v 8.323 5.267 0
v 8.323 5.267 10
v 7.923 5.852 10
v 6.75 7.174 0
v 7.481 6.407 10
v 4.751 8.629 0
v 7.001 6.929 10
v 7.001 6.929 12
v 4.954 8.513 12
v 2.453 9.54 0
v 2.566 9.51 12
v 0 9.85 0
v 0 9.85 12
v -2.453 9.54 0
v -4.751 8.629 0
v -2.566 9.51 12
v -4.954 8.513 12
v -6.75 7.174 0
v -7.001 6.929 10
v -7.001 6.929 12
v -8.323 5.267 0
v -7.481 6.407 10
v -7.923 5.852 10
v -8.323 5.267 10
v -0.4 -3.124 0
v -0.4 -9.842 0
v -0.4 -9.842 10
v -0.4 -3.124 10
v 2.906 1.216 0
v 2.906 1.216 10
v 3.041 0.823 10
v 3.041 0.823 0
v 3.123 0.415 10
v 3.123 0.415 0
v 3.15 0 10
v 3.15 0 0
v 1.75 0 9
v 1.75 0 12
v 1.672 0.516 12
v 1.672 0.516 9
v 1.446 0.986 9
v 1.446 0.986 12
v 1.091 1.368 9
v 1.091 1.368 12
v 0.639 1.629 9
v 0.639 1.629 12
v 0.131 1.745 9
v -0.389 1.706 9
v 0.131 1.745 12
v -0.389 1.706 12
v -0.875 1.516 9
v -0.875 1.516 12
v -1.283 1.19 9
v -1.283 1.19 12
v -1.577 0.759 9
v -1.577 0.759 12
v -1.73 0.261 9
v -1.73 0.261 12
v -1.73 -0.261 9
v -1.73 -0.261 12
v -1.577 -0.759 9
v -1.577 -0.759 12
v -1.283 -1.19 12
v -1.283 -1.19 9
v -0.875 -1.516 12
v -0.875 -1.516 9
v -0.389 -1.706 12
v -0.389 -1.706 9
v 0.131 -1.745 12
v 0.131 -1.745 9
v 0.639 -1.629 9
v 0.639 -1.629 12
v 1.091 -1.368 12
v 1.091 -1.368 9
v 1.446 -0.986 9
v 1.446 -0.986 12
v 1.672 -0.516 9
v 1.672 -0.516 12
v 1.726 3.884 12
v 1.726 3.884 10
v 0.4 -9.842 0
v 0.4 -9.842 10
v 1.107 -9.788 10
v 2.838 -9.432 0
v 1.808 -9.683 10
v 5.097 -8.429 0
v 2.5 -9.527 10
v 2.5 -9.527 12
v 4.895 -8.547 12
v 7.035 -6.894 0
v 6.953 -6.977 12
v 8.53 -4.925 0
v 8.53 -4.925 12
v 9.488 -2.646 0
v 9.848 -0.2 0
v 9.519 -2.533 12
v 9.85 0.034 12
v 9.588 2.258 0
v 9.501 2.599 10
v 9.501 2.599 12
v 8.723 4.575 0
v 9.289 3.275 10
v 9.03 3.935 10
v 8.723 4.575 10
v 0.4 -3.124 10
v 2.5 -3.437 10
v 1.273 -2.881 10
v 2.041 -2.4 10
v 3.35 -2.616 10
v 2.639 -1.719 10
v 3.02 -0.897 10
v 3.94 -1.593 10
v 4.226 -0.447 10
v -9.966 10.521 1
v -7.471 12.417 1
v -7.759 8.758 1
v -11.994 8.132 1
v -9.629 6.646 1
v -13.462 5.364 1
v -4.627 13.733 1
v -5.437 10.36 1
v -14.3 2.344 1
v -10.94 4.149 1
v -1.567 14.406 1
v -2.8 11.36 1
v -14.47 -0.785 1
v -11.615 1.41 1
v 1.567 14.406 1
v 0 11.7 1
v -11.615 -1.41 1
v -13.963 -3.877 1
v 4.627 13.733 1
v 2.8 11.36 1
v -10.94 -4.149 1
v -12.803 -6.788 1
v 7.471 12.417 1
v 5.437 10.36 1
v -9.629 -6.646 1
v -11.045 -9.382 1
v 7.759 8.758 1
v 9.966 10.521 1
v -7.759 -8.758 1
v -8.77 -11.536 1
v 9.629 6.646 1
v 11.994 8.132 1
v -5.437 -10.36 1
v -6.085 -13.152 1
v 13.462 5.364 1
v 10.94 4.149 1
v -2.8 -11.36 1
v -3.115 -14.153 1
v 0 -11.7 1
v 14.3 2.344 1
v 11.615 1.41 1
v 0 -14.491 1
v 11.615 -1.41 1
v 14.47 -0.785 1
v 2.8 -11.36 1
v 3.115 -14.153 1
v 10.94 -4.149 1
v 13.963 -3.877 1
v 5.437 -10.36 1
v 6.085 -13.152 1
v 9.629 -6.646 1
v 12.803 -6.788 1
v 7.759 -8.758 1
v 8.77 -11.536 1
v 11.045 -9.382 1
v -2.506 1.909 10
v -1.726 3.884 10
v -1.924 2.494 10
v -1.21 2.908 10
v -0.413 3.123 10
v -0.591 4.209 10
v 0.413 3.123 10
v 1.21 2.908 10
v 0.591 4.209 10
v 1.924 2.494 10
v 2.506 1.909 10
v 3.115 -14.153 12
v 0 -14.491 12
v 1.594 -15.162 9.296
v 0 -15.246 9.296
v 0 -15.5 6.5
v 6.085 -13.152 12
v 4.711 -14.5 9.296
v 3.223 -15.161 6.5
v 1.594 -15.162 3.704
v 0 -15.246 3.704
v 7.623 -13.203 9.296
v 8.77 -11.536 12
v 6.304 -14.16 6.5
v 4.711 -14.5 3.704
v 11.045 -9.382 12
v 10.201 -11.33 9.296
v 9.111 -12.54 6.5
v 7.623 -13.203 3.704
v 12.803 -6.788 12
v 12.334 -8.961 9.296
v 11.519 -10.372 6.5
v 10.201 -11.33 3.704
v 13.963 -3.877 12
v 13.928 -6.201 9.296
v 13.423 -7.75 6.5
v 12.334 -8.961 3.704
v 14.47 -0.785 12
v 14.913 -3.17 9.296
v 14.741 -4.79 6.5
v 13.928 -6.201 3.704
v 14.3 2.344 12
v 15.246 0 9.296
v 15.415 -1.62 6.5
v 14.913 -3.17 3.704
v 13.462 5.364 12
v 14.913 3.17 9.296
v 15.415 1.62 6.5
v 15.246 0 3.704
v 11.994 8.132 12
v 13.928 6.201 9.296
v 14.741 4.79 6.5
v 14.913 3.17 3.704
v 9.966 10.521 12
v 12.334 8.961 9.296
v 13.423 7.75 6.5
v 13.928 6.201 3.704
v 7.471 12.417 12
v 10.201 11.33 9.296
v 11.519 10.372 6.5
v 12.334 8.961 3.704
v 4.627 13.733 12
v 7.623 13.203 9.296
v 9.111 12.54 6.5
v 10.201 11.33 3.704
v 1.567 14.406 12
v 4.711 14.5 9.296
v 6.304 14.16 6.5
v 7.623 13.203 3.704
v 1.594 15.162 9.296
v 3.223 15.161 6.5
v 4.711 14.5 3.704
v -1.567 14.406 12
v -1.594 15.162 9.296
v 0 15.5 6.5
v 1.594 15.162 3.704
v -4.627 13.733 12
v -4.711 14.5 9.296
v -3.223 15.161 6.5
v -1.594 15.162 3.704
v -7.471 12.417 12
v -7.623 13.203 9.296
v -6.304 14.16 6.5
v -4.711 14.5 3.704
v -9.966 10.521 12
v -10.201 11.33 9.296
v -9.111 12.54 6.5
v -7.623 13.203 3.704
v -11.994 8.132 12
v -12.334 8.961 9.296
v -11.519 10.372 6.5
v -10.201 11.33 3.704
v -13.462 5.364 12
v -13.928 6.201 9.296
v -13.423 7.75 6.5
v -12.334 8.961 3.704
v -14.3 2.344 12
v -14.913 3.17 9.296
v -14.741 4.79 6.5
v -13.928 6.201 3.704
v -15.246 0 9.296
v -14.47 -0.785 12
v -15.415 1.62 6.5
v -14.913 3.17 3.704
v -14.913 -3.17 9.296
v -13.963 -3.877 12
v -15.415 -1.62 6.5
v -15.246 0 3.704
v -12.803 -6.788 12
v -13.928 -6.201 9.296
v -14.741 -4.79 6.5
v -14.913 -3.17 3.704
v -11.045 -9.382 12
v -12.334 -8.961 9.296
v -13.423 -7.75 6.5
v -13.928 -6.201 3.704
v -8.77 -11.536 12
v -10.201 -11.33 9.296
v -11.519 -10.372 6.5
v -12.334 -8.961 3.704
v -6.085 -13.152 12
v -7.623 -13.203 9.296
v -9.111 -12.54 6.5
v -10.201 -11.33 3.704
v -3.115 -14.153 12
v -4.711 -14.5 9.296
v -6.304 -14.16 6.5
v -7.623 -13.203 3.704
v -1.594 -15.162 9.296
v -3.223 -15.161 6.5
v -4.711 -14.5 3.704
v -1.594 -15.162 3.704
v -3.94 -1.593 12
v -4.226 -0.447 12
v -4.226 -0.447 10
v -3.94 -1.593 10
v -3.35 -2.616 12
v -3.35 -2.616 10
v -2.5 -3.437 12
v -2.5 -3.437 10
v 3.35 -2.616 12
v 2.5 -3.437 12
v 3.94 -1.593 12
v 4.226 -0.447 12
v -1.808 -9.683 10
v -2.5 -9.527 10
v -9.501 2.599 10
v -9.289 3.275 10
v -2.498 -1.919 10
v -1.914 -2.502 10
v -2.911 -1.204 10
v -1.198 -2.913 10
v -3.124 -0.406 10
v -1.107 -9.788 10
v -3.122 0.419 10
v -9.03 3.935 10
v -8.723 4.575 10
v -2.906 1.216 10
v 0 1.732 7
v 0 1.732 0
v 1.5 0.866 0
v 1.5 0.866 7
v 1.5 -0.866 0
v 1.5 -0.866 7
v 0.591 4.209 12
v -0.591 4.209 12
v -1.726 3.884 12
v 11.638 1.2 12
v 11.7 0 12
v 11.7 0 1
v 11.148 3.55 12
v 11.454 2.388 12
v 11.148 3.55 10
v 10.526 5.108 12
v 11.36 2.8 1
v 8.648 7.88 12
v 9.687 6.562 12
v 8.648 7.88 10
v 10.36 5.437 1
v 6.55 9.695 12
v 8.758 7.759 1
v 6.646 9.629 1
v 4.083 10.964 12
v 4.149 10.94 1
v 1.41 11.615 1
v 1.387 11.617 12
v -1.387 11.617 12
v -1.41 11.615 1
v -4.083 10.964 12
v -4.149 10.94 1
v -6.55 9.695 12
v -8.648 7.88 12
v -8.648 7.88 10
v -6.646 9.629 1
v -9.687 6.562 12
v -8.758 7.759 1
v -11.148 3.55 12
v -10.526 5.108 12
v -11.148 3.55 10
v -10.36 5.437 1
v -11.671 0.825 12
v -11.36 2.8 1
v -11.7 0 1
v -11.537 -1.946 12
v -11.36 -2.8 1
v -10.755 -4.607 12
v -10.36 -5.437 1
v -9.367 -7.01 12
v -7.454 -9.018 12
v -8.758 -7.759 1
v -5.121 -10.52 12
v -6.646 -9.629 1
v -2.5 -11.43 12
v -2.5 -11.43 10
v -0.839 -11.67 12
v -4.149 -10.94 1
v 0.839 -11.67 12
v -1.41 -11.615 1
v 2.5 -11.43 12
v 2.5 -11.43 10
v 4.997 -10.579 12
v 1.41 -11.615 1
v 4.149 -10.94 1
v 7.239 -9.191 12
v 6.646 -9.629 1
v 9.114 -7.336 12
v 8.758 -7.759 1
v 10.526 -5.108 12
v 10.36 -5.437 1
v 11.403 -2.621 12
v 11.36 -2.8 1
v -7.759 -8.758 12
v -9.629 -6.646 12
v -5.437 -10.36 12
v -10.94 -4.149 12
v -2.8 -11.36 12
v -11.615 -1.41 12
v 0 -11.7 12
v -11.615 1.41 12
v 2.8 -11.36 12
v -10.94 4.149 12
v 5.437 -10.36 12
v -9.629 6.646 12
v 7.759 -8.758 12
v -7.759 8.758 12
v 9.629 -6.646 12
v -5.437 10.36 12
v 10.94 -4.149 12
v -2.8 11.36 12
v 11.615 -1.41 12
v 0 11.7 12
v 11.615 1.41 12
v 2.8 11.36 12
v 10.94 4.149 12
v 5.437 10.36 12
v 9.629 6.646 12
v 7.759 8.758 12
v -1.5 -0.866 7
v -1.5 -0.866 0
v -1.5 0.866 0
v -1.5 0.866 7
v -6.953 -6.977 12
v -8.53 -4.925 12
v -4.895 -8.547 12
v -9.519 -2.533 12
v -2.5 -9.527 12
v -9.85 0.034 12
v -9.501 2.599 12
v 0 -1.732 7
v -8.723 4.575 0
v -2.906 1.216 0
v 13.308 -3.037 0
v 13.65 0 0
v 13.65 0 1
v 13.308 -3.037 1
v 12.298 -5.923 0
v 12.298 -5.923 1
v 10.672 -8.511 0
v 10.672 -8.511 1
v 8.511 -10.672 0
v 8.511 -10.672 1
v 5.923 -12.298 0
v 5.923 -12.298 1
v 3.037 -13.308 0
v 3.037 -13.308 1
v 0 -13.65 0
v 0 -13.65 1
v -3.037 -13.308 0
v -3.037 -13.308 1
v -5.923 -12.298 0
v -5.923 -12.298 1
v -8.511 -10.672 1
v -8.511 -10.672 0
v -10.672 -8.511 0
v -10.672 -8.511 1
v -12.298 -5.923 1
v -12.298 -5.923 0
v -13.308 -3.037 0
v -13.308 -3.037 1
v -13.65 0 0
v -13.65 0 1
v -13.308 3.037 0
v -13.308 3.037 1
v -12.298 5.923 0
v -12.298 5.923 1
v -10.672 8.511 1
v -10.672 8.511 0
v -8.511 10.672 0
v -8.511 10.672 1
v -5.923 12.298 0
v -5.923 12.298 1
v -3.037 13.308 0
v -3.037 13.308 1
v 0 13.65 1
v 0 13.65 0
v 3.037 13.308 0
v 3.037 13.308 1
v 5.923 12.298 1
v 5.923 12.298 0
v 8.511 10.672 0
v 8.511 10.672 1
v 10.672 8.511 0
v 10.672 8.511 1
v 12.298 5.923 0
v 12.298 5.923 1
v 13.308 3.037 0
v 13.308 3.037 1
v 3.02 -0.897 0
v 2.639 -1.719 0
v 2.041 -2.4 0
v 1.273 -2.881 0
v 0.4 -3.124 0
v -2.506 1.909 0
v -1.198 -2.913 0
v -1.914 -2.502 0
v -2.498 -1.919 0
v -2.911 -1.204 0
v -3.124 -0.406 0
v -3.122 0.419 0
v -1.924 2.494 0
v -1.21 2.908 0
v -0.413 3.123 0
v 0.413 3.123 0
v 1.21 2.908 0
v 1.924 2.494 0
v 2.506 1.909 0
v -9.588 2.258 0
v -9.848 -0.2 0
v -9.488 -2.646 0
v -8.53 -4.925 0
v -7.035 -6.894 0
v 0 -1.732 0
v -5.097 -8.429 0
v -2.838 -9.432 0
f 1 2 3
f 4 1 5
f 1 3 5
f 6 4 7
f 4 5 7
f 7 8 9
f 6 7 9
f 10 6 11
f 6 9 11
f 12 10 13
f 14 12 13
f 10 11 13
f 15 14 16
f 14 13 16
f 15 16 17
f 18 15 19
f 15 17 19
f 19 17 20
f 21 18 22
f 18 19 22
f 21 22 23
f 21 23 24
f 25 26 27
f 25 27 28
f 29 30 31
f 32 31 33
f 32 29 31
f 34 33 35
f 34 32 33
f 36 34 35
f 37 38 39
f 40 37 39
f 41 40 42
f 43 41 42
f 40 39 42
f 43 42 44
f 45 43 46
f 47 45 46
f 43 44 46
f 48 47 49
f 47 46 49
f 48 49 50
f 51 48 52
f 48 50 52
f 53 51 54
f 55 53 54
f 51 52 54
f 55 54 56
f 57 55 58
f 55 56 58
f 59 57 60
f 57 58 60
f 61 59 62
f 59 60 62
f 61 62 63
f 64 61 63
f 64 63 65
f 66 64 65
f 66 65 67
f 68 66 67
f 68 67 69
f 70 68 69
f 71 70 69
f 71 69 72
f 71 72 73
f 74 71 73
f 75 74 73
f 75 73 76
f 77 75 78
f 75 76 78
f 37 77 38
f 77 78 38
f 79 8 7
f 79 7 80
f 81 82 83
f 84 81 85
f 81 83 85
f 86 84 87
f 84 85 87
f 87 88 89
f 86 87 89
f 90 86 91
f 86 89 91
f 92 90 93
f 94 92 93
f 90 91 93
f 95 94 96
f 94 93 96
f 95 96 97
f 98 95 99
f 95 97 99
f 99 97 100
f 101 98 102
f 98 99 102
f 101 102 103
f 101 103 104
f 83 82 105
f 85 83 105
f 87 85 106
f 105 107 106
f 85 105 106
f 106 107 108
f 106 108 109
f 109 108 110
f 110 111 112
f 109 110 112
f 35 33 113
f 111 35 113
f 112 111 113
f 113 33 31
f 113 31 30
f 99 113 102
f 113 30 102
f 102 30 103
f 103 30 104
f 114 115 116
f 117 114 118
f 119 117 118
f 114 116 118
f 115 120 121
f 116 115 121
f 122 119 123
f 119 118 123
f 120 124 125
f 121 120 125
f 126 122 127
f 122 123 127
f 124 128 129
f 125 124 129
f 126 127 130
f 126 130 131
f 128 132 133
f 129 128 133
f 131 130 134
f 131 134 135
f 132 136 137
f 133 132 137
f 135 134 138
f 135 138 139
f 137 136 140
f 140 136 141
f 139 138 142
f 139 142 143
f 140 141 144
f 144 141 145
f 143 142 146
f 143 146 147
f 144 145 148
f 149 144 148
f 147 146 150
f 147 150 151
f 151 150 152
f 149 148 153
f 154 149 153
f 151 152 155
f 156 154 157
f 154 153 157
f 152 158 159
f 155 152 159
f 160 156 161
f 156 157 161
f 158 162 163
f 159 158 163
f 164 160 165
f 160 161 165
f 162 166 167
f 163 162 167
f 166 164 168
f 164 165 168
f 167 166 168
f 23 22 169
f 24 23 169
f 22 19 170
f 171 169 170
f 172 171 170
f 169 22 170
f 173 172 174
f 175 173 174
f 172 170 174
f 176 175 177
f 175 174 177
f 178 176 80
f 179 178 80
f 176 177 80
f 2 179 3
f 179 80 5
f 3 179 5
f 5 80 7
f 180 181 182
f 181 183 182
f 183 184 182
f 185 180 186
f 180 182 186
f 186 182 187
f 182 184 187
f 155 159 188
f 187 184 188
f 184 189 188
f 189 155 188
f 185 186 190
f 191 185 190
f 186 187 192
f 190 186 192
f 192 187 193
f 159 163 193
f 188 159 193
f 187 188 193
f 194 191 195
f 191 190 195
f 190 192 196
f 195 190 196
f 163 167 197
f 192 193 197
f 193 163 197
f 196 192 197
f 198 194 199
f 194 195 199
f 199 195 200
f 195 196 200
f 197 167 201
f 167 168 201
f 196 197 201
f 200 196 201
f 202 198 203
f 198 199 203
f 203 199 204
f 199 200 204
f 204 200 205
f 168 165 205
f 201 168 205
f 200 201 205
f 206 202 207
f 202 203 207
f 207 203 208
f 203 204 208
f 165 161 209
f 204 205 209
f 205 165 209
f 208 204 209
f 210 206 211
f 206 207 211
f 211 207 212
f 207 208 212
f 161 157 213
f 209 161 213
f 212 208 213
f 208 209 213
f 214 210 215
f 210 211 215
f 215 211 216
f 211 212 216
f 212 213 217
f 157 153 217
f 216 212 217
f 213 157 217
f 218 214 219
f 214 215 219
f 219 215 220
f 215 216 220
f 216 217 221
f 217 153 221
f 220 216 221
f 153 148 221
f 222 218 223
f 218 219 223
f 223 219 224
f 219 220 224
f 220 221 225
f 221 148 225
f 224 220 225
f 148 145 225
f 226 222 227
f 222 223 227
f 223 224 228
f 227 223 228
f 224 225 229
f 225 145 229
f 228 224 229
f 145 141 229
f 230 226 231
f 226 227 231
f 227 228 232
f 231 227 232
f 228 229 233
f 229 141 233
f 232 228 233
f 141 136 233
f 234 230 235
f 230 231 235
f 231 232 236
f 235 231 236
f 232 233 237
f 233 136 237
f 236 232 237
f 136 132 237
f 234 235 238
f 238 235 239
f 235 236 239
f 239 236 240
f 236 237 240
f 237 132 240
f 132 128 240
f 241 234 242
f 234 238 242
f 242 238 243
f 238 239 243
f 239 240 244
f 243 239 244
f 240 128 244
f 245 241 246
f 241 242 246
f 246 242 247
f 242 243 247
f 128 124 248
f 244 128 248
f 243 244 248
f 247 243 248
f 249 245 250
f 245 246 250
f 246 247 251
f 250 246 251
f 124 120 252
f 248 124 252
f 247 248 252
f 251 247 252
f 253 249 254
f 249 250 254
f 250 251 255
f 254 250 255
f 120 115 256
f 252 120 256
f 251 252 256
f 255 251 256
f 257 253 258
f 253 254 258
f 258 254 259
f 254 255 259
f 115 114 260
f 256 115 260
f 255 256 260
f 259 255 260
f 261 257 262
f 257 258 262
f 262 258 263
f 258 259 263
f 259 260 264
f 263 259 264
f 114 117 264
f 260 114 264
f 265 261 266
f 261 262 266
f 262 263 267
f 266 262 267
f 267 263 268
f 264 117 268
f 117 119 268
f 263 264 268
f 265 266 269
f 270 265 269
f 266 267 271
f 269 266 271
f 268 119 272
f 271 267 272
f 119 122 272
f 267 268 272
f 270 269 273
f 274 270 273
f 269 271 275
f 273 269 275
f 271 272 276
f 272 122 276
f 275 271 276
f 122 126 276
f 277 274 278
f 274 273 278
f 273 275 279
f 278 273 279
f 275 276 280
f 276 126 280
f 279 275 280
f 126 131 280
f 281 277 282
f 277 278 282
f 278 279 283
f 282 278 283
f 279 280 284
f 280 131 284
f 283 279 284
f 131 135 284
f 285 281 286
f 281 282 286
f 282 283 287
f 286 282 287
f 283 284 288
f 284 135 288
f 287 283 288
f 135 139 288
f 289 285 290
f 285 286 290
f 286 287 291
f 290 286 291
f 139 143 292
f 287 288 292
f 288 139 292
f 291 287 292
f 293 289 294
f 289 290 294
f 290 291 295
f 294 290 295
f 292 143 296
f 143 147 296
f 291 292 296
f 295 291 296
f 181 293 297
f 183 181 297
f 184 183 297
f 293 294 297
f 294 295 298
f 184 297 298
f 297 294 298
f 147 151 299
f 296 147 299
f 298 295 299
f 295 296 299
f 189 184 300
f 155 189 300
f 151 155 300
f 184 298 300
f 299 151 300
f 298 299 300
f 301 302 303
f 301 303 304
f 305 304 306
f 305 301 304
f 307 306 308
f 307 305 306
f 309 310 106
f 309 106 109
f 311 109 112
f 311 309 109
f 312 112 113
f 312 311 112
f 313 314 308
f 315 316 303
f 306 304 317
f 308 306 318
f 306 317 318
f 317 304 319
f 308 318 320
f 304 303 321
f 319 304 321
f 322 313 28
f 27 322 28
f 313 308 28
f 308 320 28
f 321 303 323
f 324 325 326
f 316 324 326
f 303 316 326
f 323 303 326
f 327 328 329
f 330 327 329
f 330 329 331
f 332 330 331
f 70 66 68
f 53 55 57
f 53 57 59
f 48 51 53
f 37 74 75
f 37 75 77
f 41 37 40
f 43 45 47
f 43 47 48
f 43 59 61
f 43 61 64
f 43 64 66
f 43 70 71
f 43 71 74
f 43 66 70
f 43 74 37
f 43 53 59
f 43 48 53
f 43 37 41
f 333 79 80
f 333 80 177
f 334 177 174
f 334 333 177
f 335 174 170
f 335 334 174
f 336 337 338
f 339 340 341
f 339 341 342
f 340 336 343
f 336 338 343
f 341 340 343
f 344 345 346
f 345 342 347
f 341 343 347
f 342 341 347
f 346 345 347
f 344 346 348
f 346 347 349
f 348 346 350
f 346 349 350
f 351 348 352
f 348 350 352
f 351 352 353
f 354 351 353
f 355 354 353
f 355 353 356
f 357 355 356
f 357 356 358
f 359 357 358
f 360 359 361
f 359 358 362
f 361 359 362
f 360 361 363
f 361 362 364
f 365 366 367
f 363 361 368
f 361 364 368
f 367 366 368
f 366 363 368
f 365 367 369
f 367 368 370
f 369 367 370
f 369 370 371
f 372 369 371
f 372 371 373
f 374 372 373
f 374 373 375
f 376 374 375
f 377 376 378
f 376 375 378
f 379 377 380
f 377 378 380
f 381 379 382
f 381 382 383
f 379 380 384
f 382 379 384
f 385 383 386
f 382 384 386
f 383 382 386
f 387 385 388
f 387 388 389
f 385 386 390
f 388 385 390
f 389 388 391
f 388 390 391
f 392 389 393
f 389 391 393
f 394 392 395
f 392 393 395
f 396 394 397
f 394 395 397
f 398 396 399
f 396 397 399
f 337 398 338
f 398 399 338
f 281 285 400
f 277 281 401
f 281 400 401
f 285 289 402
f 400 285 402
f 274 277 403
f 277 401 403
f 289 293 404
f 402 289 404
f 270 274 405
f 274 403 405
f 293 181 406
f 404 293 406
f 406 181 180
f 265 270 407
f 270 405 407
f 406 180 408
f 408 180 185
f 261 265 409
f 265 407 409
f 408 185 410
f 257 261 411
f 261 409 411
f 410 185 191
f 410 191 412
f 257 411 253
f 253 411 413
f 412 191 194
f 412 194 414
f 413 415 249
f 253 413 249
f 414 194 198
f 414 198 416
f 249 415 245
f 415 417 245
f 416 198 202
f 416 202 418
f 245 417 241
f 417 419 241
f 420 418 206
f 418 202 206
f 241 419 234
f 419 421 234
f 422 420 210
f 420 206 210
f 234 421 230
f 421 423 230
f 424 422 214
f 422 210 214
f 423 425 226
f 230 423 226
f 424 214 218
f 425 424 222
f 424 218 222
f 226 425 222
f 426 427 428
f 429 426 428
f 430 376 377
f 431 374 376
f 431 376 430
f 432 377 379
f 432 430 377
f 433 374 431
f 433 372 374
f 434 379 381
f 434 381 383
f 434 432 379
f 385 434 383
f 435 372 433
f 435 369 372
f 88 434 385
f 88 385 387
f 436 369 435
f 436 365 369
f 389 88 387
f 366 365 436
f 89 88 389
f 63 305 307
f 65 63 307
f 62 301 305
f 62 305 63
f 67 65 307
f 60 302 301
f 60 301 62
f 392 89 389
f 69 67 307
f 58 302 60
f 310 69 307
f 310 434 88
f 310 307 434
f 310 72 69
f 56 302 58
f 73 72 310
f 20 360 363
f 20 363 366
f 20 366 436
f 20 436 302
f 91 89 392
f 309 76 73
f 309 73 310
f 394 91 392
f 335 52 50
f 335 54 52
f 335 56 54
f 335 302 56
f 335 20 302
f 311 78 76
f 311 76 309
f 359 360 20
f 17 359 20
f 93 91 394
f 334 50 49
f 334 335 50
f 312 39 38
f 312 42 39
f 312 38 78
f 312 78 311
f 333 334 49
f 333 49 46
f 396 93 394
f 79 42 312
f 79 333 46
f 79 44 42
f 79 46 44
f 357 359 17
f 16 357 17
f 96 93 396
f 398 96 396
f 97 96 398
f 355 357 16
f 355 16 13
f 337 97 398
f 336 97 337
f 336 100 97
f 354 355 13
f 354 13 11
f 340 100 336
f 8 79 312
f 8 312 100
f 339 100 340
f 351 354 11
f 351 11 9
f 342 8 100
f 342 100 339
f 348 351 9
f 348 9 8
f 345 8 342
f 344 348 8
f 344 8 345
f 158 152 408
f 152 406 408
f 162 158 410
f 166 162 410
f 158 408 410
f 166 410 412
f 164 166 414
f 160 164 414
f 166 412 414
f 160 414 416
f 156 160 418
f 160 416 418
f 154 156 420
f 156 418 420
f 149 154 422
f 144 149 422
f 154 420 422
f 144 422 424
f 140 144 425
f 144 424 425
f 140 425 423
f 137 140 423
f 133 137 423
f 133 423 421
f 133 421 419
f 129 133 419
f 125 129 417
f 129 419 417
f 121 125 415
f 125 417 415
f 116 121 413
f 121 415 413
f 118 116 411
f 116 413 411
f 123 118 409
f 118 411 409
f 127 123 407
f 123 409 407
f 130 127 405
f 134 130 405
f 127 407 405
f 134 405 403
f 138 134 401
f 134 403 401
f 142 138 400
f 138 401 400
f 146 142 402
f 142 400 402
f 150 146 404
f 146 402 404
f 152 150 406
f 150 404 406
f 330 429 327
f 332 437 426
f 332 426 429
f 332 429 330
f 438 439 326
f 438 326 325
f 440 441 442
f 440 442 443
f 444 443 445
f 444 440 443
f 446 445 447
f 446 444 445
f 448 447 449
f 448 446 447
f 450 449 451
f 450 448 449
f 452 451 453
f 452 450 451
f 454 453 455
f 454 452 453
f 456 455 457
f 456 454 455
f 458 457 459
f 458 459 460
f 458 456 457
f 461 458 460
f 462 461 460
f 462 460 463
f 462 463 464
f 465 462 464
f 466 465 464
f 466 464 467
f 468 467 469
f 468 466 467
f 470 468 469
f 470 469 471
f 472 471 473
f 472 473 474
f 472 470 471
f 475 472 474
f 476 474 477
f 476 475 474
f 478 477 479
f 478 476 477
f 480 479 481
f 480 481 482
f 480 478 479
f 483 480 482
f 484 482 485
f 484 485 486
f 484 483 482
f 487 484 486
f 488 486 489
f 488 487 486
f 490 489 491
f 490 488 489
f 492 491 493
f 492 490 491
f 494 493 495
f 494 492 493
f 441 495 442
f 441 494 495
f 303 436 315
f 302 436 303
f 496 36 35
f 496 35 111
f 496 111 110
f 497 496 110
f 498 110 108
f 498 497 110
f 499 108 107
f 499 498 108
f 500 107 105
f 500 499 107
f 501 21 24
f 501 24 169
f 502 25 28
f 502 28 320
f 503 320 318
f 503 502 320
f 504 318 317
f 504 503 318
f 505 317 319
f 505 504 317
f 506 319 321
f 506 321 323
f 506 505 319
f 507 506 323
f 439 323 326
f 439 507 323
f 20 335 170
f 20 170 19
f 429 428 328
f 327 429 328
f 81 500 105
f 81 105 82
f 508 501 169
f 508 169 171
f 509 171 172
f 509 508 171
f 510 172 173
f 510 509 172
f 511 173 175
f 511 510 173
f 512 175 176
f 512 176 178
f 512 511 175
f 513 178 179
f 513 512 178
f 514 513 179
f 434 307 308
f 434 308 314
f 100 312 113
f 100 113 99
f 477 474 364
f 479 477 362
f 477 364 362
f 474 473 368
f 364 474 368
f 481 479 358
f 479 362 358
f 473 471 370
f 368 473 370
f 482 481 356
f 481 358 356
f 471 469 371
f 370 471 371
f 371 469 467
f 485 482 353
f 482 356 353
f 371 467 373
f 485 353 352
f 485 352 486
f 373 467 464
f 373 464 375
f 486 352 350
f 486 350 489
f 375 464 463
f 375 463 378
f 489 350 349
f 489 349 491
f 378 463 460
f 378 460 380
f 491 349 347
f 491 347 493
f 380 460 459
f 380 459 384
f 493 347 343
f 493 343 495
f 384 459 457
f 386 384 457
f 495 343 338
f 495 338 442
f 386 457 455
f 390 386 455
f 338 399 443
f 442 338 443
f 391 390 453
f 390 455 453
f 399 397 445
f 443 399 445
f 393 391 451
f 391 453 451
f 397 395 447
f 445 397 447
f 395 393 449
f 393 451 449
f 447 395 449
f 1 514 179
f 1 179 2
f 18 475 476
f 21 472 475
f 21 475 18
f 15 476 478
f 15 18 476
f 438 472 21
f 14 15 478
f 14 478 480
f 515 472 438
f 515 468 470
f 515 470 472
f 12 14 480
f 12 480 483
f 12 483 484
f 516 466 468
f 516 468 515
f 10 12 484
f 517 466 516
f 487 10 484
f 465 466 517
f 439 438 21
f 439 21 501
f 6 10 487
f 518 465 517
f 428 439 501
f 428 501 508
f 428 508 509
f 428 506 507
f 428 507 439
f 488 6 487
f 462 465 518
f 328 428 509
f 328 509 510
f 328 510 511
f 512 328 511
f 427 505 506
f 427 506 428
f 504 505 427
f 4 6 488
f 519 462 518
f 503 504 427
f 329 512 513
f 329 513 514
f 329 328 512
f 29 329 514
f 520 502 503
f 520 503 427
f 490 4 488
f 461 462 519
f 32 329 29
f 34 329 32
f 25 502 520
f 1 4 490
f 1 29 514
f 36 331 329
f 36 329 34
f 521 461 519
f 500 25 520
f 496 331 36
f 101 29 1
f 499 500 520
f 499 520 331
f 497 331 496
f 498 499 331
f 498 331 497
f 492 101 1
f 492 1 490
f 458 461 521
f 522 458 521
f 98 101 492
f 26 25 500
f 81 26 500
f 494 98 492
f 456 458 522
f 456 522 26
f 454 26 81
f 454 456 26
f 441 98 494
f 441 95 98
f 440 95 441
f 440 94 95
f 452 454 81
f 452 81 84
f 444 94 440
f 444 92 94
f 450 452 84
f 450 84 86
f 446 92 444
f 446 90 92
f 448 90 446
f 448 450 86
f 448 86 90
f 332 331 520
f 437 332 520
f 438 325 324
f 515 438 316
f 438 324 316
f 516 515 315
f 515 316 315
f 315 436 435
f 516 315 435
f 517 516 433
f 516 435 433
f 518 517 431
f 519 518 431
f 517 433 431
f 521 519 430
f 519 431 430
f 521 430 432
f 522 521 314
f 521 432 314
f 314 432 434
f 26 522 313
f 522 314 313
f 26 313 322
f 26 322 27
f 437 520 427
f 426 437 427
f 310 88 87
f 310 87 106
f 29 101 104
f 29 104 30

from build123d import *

# Parameters (mm, degrees)
F0_R      = 11.7
F1_DEPTH  = 12
F2_R      = 13.65
F2_R_2    = 11.7
F3_DEPTH  = 1
F4_R      = 9.85
F5_DEPTH  = 12
F7_DEPTH  = 12
F9_DEPTH  = 2
F11_DEPTH = 10
F13_DEPTH = 7
F14_R     = 1.75
F15_DEPTH = 3


with BuildPart() as f1:
    # F0 (on Top) → F1 (new body)
    with BuildSketch(Plane.XY):
        Circle(F0_R)
    extrude(amount=F1_DEPTH)

    # F2 (on face) → F3 (join)
    with BuildSketch(Plane(origin=(0, 0, 0), x_dir=(1, 0, 0), z_dir=(0, 0, -1))):
        Circle(F2_R)
        Circle(F2_R_2, mode=Mode.SUBTRACT)
    extrude(amount=-F3_DEPTH)

    # F4 (on face) → F5 (cut, through all)
    with BuildSketch(Plane.XY.offset(12)):
        Circle(F4_R)
    extrude(amount=-F5_DEPTH, mode=Mode.SUBTRACT)

    # F6 (on face) → F7 (join, through all)
    with BuildSketch(Plane(origin=(0, 0, 0), x_dir=(1, 0, 0), z_dir=(0, 0, -1))):
        Polygon((0.4, -0.2309401077), (0, 0.4618802154), (-0.4, -0.2309401077), align=None)
        with BuildLine():
            Line((0.4, 0.2309401077), (0.4, 9.8418748214))
            ThreePointArc((0.4, 9.8418748214), (0, 9.85), (-0.4, 9.8418748214))
            Line((-0.4, 9.8418748214), (-0.4, 0.2309401077))
            Line((-0.4, 0.2309401077), (0, 0.4618802154))
            Line((0, 0.4618802154), (0.4, 0.2309401077))
        make_face()
        with BuildLine():
            Line((-0.4, 0.2309401077), (-8.7233136162, -4.5745272492))
            ThreePointArc((-8.7233136162, -4.5745272492), (-8.5303502273, -4.925), (-8.3233136162, -5.2673475722))
            Line((-8.3233136162, -5.2673475722), (0, -0.4618802154))
            Line((0, -0.4618802154), (-0.4, -0.2309401077))
            Line((-0.4, -0.2309401077), (-0.4, 0.2309401077))
        make_face()
        with BuildLine():
            ThreePointArc((8.3233136162, -5.2673475722), (8.5303502273, -4.925), (8.7233136162, -4.5745272492))
            Line((8.7233136162, -4.5745272492), (0.4, 0.2309401077))
            Line((0.4, 0.2309401077), (0.4, -0.2309401077))
            Line((0.4, -0.2309401077), (0, -0.4618802154))
            Line((0, -0.4618802154), (8.3233136162, -5.2673475722))
        make_face()
        Polygon((0, -0.4618802154), (0.4, -0.2309401077), (-0.4, -0.2309401077), align=None)
        Polygon((0, 0.4618802154), (-0.4, 0.2309401077), (-0.4, -0.2309401077), align=None)
        Polygon((0.4, -0.2309401077), (0.4, 0.2309401077), (0, 0.4618802154), align=None)
    extrude(amount=-F7_DEPTH)

    # F8 (on face) → F9 (join)
    with BuildSketch(Plane.XY.offset(12)):
        with BuildLine():
            Line((-9.5010226639, 2.5986666466), (-4.2264702249, -0.4465976239))
            ThreePointArc((-4.2264702249, -0.4465976239), (-3.6806079661, -2.125), (-2.5, -3.4369317712))
            Line((-2.5, -3.4369317712), (-2.5, -9.5274603122))
            ThreePointArc((-2.5, -9.5274603122), (-1.4584972132, -9.7414211427), (-0.4, -9.8418748214))
            Line((-0.4, -9.8418748214), (-0.4, -0.2309401077))
            Line((-0.4, -0.2309401077), (-8.7233136162, 4.5745272492))
            ThreePointArc((-8.7233136162, 4.5745272492), (-9.1655667851, 3.6076149334), (-9.5010226639, 2.5986666466))
        make_face()
        with BuildLine():
            Line((-1.7264702249, 3.8835293951), (-7.0010226639, 6.9287936655))
            ThreePointArc((-7.0010226639, 6.9287936655), (-7.7070695719, 6.1338062093), (-8.3233136162, 5.2673475722))
            Line((-8.3233136162, 5.2673475722), (0, 0.4618802154))
            Line((0, 0.4618802154), (8.3233136162, 5.2673475722))
            ThreePointArc((8.3233136162, 5.2673475722), (7.7070695719, 6.1338062093), (7.0010226639, 6.9287936655))
            Line((7.0010226639, 6.9287936655), (1.7264702249, 3.8835293951))
            ThreePointArc((1.7264702249, 3.8835293951), (0, 4.25), (-1.7264702249, 3.8835293951))
        make_face()
        with BuildLine():
            ThreePointArc((0.4, -9.8418748214), (1.4584972132, -9.7414211427), (2.5, -9.5274603122))
            Line((2.5, -9.5274603122), (2.5, -3.4369317712))
            ThreePointArc((2.5, -3.4369317712), (3.6806079661, -2.125), (4.2264702249, -0.4465976239))
            Line((4.2264702249, -0.4465976239), (9.5010226639, 2.5986666466))
            ThreePointArc((9.5010226639, 2.5986666466), (9.1655667851, 3.6076149334), (8.7233136162, 4.5745272492))
            Line((8.7233136162, 4.5745272492), (0.4, -0.2309401077))
            Line((0.4, -0.2309401077), (0.4, -9.8418748214))
        make_face()
        with BuildLine():
            Line((-11.1484847325, 3.5498293154), (-9.5010226639, 2.5986666466))
            ThreePointArc((-9.5010226639, 2.5986666466), (-9.1655667851, 3.6076149334), (-8.7233136162, 4.5745272492))
            Line((-8.7233136162, 4.5745272492), (-0.4, -0.2309401077))
            Line((-0.4, -0.2309401077), (-0.4, -9.8418748214))
            ThreePointArc((-0.4, -9.8418748214), (-1.4584972132, -9.7414211427), (-2.5, -9.5274603122))
            Line((-2.5, -9.5274603122), (-2.5, -11.4297856498))
            Line((-2.5, -11.4297856498), (2.5, -11.4297856498))
            Line((2.5, -11.4297856498), (2.5, -9.5274603122))
            ThreePointArc((2.5, -9.5274603122), (1.4584972132, -9.7414211427), (0.4, -9.8418748214))
            Line((0.4, -9.8418748214), (0.4, -0.2309401077))
            Line((0.4, -0.2309401077), (8.7233136162, 4.5745272492))
            ThreePointArc((8.7233136162, 4.5745272492), (9.1655667851, 3.6076149334), (9.5010226639, 2.5986666466))
            Line((9.5010226639, 2.5986666466), (11.1484847325, 3.5498293154))
            Line((11.1484847325, 3.5498293154), (8.6484847325, 7.8799563344))
            Line((8.6484847325, 7.8799563344), (7.0010226639, 6.9287936655))
            ThreePointArc((7.0010226639, 6.9287936655), (7.7070695719, 6.1338062093), (8.3233136162, 5.2673475722))
            Line((8.3233136162, 5.2673475722), (0, 0.4618802154))
            Line((0, 0.4618802154), (-8.3233136162, 5.2673475722))
            ThreePointArc((-8.3233136162, 5.2673475722), (-7.7070695719, 6.1338062093), (-7.0010226639, 6.9287936655))
            Line((-7.0010226639, 6.9287936655), (-8.6484847325, 7.8799563344))
            Line((-8.6484847325, 7.8799563344), (-11.1484847325, 3.5498293154))
        make_face()
    extrude(amount=-F9_DEPTH)

    # F10 (on face) → F11 (join, through all)
    with BuildSketch(Plane(origin=(0, 0, 0), x_dir=(1, 0, 0), z_dir=(0, 0, -1))):
        with BuildLine():
            Line((-0.4, 0.2309401077), (-0.4, 3.12449996))
            ThreePointArc((-0.4, 3.12449996), (-2.7279800219, 1.575), (-2.9058963395, -1.2158398185))
            Line((-2.9058963395, -1.2158398185), (-0.4, 0.2309401077))
        make_face()
        with BuildLine():
            Line((0.4, 0.2309401077), (0.4, 3.12449996))
            ThreePointArc((0.4, 3.12449996), (0, 3.15), (-0.4, 3.12449996))
            Line((-0.4, 3.12449996), (-0.4, 0.2309401077))
            Line((-0.4, 0.2309401077), (-2.9058963395, -1.2158398185))
            ThreePointArc((-2.9058963395, -1.2158398185), (-2.7279800219, -1.575), (-2.5058963395, -1.9086601415))
            Line((-2.5058963395, -1.9086601415), (0, -0.4618802154))
            Line((0, -0.4618802154), (2.5058963395, -1.9086601415))
            ThreePointArc((2.5058963395, -1.9086601415), (2.7279800219, -1.575), (2.9058963395, -1.2158398185))
            Line((2.9058963395, -1.2158398185), (0.4, 0.2309401077))
        make_face()
        with BuildLine():
            ThreePointArc((-2.5058963395, -1.9086601415), (0, -3.15), (2.5058963395, -1.9086601415))
            Line((2.5058963395, -1.9086601415), (0, -0.4618802154))
            Line((0, -0.4618802154), (-2.5058963395, -1.9086601415))
        make_face()
        with BuildLine():
            ThreePointArc((2.9058963395, -1.2158398185), (3.0883712106, -0.6200510183), (3.15, 0))
            ThreePointArc((3.15, 0), (2.3645824156, 2.0811655388), (0.4, 3.12449996))
            Line((0.4, 3.12449996), (0.4, 0.2309401077))
            Line((0.4, 0.2309401077), (2.9058963395, -1.2158398185))
        make_face()
    extrude(amount=-F11_DEPTH)

    # F12 (on face) → F13 (cut)
    with BuildSketch(Plane(origin=(0, 0, 0), x_dir=(1, 0, 0), z_dir=(0, 0, -1))):
        Polygon((1.5, -0.8660254038), (1.5, 0.8660254038), (0, 1.7320508076), (-1.5, 0.8660254038), (-1.5, -0.8660254038), (0, -1.7320508076), align=None)
    extrude(amount=-F13_DEPTH, mode=Mode.SUBTRACT)

    # F14 (on face) → F15 (cut)
    with BuildSketch(Plane.XY.offset(12)):
        Circle(F14_R)
    extrude(amount=-F15_DEPTH, mode=Mode.SUBTRACT)


with BuildPart() as f17:
    # F16 (on Right) → F17 (revolve)
    with BuildSketch(Plane.YZ):
        with BuildLine():
            Line((-14.4913767462, 1), (-11.7, 1))
            Line((-11.7, 1), (-11.7, 12))
            Line((-11.7, 12), (-14.4913767462, 12))
            ThreePointArc((-14.4913767462, 12), (-15.5, 6.5), (-14.4913767462, 1))
        make_face()
    revolve(axis=Axis((0, 0, 9.3064010143), (0, 0, 1)))


solid = Compound([f1.part, f17.part])
